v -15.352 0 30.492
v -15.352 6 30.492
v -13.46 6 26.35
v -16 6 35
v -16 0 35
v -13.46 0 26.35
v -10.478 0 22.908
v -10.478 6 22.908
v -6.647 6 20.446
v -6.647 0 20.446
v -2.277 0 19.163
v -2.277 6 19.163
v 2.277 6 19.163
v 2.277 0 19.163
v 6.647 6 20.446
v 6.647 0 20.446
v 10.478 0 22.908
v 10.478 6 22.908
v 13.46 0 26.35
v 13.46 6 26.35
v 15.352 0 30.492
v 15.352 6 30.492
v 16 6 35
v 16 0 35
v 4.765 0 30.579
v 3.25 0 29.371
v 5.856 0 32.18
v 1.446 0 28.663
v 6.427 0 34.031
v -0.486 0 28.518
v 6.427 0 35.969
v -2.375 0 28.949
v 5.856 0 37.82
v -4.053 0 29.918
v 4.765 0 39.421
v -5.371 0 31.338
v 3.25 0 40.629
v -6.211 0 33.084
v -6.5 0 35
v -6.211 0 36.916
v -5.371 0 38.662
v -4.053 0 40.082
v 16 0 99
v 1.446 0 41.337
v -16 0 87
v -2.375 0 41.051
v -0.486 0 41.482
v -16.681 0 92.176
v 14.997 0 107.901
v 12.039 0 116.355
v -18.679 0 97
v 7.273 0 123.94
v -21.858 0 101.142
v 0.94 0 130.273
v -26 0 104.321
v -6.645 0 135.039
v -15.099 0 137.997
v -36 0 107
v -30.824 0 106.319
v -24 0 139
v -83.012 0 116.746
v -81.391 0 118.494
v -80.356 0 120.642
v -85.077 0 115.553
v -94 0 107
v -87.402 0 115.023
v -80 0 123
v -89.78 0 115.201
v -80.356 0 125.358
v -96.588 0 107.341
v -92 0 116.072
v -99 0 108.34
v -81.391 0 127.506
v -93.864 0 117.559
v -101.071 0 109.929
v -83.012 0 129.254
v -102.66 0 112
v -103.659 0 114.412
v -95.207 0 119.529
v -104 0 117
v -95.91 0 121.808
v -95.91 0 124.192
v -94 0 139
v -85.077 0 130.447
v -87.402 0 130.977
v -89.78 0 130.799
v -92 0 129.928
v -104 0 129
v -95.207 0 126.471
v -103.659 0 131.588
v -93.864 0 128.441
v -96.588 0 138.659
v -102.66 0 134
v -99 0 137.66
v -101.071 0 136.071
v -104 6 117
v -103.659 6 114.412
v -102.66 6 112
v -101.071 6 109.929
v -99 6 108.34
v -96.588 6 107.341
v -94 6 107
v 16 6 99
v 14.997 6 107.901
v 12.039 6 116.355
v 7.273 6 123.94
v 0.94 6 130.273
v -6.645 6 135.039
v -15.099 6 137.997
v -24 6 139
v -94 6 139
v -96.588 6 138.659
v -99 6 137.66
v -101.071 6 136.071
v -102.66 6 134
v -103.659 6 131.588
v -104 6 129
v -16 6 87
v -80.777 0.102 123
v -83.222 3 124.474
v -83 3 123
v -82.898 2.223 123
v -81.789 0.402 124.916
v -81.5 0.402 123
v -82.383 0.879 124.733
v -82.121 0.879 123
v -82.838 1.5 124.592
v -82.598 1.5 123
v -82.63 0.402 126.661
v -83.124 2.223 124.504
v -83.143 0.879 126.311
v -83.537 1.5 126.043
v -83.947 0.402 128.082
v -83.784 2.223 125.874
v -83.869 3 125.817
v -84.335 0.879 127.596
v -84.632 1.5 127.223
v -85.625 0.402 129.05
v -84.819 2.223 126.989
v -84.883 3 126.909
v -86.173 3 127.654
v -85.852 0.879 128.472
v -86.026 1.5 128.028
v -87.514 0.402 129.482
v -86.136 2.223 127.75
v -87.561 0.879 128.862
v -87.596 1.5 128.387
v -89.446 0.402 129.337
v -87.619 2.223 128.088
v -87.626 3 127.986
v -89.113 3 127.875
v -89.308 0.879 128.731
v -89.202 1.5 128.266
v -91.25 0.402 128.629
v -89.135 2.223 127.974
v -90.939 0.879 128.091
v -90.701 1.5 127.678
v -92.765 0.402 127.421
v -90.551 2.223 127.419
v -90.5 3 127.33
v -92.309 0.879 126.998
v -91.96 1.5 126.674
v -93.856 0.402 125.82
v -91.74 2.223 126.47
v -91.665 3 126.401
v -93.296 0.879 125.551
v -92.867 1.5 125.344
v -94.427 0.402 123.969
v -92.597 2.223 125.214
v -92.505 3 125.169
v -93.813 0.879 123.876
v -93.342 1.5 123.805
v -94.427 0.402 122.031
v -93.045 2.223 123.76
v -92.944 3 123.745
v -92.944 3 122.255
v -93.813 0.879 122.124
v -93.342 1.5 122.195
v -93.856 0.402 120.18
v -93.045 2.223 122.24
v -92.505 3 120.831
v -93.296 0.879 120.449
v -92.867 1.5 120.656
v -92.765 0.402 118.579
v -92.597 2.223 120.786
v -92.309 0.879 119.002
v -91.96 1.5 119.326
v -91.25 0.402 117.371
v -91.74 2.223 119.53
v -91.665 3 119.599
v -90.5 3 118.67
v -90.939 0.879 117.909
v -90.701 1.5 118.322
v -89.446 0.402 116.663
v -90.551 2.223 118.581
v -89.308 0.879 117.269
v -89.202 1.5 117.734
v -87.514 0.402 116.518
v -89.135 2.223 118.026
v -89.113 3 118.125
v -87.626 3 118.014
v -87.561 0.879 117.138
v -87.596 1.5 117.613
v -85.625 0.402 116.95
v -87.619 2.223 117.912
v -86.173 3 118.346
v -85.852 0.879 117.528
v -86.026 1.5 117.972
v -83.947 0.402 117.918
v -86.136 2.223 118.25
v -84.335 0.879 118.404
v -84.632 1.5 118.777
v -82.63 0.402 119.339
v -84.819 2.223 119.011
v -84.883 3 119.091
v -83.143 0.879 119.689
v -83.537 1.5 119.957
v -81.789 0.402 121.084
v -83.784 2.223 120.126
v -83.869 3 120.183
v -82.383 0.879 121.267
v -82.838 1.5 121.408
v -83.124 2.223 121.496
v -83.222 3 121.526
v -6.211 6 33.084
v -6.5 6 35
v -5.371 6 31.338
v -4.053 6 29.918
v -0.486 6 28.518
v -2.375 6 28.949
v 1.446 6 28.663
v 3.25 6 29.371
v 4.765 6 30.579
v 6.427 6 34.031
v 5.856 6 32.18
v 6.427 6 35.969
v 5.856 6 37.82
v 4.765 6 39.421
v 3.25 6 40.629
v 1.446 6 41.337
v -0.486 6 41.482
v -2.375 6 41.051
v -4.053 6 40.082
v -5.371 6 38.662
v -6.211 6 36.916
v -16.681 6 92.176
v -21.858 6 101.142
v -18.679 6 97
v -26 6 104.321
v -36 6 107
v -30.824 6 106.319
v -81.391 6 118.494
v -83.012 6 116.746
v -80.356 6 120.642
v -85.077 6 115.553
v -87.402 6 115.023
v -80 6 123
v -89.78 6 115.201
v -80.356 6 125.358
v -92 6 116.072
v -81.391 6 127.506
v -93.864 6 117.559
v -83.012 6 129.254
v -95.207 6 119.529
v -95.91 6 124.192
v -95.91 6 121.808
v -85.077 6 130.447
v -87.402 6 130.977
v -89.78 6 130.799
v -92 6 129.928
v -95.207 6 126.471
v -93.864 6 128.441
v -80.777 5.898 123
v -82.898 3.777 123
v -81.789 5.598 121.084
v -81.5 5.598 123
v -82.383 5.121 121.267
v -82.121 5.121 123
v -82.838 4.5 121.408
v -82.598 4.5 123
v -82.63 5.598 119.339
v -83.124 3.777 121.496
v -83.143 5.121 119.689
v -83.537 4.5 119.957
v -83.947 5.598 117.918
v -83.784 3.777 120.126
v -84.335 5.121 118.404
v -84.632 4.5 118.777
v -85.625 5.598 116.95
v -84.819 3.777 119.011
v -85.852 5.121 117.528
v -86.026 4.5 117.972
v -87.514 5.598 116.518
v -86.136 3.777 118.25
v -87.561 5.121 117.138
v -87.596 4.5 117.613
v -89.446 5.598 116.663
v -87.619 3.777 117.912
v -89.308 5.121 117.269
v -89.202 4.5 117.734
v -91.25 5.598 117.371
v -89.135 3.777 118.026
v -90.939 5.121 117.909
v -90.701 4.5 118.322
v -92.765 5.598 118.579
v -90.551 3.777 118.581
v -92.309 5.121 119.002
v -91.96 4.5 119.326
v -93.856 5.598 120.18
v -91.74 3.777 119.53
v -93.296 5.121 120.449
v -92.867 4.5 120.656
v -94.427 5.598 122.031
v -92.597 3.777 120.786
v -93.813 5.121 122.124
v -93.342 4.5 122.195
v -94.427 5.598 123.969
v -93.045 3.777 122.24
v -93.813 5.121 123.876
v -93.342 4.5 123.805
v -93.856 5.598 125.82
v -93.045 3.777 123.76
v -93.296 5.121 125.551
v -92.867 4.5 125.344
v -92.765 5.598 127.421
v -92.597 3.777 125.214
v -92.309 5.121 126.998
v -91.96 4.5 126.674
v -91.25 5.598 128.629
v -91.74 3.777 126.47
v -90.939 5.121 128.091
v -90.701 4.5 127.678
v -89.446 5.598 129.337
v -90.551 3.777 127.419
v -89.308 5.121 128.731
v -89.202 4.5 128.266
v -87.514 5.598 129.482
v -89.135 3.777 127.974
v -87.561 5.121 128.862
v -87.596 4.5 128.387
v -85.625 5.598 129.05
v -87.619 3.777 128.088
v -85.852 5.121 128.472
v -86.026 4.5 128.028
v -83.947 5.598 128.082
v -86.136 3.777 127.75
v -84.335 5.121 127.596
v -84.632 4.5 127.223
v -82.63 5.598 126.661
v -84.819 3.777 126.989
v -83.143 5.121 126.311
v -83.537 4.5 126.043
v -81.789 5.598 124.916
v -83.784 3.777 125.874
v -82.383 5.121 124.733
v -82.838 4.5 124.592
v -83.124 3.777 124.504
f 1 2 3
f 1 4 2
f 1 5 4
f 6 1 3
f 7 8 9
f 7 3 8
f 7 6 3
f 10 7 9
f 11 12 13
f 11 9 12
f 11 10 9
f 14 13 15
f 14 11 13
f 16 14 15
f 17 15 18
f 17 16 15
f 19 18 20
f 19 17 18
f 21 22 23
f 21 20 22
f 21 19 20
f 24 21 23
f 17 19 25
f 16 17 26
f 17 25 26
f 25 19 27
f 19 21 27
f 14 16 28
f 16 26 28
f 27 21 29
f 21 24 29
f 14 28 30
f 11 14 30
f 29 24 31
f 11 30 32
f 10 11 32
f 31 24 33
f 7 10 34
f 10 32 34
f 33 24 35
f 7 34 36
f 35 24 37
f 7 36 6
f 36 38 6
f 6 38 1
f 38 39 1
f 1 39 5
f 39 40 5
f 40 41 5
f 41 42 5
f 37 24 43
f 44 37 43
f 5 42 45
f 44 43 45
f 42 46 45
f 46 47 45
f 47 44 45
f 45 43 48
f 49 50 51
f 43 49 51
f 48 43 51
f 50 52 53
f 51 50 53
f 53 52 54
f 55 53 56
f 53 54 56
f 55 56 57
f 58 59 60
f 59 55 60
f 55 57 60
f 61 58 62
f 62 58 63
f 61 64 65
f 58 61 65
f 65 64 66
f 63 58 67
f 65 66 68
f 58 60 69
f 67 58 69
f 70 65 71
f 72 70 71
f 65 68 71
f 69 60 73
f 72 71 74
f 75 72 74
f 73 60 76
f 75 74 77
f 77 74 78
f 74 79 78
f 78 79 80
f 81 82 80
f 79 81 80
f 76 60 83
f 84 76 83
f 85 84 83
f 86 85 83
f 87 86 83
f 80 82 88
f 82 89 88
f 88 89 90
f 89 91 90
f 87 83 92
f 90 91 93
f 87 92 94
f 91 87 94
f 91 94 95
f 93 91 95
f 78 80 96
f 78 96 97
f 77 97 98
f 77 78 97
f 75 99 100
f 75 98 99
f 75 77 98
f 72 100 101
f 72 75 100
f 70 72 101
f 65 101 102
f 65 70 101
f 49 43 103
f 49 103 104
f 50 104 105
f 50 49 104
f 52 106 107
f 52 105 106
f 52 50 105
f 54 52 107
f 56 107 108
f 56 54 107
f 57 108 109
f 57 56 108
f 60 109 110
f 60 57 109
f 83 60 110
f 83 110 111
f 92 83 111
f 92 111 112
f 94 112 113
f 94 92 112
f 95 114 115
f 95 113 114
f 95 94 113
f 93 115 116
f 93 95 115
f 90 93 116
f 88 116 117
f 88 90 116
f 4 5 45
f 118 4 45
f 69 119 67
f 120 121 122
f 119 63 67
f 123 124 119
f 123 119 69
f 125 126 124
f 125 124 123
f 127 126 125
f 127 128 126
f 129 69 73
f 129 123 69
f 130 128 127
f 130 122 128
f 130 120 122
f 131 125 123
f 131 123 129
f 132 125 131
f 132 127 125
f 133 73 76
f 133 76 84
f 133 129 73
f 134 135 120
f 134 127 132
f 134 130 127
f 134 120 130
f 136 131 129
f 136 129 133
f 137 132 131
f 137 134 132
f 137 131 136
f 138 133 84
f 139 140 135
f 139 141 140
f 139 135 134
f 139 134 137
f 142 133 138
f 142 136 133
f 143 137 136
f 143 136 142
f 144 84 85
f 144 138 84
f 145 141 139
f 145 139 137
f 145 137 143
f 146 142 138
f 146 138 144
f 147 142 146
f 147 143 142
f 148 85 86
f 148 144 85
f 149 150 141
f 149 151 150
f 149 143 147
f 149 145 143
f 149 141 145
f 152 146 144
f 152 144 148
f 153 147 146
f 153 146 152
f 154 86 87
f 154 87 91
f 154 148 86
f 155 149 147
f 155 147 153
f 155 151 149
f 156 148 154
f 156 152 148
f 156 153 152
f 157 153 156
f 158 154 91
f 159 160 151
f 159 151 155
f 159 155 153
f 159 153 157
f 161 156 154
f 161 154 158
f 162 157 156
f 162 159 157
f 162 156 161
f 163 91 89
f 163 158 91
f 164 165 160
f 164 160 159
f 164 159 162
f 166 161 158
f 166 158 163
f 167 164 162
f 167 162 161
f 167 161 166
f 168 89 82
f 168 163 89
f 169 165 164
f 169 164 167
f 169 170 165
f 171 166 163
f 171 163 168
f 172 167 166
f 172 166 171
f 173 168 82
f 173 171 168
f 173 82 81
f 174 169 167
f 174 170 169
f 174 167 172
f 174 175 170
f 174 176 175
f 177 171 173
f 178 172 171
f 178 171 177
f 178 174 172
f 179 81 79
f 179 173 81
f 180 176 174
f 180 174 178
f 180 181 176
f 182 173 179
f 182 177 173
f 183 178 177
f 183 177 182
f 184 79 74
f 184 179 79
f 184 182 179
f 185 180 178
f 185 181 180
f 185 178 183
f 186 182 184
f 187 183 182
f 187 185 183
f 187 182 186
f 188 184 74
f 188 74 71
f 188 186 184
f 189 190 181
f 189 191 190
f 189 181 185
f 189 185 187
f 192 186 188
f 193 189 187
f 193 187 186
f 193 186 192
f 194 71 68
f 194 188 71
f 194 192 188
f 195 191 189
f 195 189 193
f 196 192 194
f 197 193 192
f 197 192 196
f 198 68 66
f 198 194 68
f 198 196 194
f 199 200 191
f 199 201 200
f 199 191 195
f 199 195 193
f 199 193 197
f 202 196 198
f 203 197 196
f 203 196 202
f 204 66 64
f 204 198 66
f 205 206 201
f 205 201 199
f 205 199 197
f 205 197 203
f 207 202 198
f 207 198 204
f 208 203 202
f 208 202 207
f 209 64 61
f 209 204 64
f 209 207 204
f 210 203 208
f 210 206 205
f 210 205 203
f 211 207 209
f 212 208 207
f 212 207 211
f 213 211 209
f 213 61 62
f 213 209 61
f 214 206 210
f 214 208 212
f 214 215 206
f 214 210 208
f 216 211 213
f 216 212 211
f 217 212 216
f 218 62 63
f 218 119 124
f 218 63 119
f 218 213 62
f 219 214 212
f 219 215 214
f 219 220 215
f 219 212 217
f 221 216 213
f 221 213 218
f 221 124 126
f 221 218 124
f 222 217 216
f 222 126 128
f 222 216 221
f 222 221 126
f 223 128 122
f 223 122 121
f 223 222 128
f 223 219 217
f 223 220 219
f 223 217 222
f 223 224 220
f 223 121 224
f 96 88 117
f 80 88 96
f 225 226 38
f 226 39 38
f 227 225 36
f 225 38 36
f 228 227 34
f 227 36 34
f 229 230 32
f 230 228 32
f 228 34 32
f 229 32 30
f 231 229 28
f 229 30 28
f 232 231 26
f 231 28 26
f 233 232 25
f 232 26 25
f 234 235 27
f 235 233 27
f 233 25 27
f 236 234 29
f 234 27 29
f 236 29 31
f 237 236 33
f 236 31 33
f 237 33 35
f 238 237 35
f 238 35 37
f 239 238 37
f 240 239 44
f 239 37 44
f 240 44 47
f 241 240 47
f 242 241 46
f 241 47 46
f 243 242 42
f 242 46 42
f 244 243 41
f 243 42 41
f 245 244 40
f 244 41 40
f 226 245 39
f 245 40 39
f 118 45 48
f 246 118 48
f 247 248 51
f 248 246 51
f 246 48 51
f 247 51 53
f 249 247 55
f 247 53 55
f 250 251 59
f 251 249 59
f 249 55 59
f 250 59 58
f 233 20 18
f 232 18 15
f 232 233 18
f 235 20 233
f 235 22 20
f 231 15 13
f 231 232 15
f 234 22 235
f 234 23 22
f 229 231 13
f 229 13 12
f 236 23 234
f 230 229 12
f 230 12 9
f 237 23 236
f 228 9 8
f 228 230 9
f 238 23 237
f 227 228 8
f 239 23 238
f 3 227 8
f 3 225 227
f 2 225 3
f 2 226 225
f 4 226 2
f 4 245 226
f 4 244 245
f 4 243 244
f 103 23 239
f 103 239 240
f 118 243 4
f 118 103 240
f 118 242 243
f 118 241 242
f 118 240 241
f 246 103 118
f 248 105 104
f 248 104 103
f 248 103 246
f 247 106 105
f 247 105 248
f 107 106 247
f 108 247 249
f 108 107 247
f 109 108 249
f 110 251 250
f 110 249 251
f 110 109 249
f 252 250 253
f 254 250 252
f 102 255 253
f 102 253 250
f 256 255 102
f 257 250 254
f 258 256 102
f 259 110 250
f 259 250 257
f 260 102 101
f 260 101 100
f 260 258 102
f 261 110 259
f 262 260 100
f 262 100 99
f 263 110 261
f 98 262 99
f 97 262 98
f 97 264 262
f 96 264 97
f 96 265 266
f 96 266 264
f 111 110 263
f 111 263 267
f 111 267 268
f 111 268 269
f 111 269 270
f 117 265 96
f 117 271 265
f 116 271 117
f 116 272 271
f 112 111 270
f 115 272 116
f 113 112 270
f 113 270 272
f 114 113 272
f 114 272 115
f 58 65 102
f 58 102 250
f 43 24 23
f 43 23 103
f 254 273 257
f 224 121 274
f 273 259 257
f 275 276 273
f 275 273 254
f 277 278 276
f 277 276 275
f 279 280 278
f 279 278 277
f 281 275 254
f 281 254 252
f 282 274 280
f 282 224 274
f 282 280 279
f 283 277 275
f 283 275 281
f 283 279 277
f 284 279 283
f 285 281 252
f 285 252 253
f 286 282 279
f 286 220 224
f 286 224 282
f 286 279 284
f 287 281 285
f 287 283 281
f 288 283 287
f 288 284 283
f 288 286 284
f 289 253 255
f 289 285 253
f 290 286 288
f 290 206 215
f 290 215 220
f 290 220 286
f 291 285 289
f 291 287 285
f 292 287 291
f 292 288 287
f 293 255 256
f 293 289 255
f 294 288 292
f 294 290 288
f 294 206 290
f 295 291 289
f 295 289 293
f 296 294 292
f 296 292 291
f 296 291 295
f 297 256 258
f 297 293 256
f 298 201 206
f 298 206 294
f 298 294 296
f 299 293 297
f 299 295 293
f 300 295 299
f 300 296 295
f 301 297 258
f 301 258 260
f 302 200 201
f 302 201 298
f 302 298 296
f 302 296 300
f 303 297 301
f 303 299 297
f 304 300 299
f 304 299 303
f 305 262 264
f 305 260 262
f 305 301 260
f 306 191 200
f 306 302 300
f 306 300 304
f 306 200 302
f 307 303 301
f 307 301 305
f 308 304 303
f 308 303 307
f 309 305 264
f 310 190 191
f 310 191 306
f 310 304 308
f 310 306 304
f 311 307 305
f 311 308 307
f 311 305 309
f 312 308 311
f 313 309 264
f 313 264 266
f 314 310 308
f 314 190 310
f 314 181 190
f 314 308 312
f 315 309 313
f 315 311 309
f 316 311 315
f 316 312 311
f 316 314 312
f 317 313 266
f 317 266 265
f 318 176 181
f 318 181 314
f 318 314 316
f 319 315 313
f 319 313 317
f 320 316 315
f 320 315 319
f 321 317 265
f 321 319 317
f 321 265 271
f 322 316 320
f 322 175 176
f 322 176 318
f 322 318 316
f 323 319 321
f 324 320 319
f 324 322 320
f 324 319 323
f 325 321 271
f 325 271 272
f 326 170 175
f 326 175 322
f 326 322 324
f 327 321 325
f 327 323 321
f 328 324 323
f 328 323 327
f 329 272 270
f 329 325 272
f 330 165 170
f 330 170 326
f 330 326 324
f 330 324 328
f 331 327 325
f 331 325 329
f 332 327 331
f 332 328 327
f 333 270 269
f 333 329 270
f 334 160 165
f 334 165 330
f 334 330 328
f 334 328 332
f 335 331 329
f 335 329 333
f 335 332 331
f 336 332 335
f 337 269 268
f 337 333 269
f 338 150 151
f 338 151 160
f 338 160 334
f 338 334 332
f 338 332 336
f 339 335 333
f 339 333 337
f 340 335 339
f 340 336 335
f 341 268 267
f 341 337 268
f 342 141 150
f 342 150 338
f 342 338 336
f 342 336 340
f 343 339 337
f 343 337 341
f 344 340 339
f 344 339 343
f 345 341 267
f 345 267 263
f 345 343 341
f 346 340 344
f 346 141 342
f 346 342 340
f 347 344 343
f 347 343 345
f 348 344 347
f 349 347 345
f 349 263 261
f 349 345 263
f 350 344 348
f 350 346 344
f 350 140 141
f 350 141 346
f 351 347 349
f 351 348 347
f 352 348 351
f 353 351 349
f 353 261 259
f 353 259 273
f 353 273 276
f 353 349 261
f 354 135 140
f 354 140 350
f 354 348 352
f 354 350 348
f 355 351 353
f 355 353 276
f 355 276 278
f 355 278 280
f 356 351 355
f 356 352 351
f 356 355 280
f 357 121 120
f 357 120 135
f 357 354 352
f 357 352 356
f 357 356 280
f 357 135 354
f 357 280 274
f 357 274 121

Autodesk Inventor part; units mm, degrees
ref_plane "YZ Plane" through (0, 0, 0) normal (1, 0, 0) x (0, 1, 0)
ref_plane "XZ Plane" through (0, 0, 0) normal (0, 1, 0) x (-1, 0, 0)
ref_plane "XY Plane" through (0, 0, 0) normal (0, 0, 1) x (1, 0, 0)
sketch "Náčrt2" plane through (0, 0, 0) normal (0, 1, 0) x (-1, 0, 0)
  line L0 (11.5, 17.5) -> (-11.5, 17.5) construction
  line L1 (-17.5, 11.5) -> (-17.5, -11.5) construction
  line L2 (-11.5, -17.5) -> (11.5, -17.5) construction
  line L3 (17.5, -11.5) -> (17.5, 11.5) construction
  line L4 (42.5, 36) -> (42.5, -77.5) construction
  line L5 (9, -22.5) -> (-14, -22.5) construction
  line L6 (-20, -28.5) -> (-20, -51.5) construction
  line L7 (-14, -57.5) -> (9, -57.5) construction
  line L8 (15, -51.5) -> (15, -28.5) construction
  arc A0 (15, -28.5) -> (9, -22.5) centre (9, -28.5) ccw construction
  arc A1 (9, -57.5) -> (15, -51.5) centre (9, -51.5) ccw construction
  arc A2 (-20, -51.5) -> (-14, -57.5) centre (-14, -51.5) ccw construction
  arc A3 (-14, -22.5) -> (-20, -28.5) centre (-14, -28.5) ccw construction
  line L9 (-45.6938, -20) -> (9, -20) construction
  arc A4 (17.5, -28.5) -> (9, -20) centre (9, -28.5) ccw construction
  line L10 (17.5, -28.5) -> (17.5, -51.5) construction
  line L11 (17.5, -51.5) -> (15, -51.5) construction
  line L12 (-14, -22.5) -> (-45.6938, -22.5) construction
  line L13 (-45.6938, -22.5) -> (-45.6938, -20) construction
  arc A5 (17.5, 11.5) -> (11.5, 17.5) centre (11.5, 11.5) ccw construction
  arc A6 (11.5, -17.5) -> (17.5, -11.5) centre (11.5, -11.5) ccw construction
  arc A7 (-17.5, -11.5) -> (-11.5, -17.5) centre (-11.5, -11.5) ccw construction
  arc A8 (-11.5, 17.5) -> (-17.5, 11.5) centre (-11.5, 11.5) ccw construction
  line L14 (-11.5, -20) -> (11.5, -20) construction
  line L15 (-20, 73.4113) -> (-20, -11.5) construction
  arc A9 (-20, -11.5) -> (-11.5, -20) centre (-11.5, -11.5) ccw construction
  line L16 (-17.5, 11.5) -> (-17.5, 73.4113) construction
  line L17 (-17.5, 73.4113) -> (-20, 73.4113) construction
  line L18 (11.5, -20) -> (11.5, -17.5) construction
  line L19 (17.5, 17.5) -> (-17.5, 17.5) construction
  line L20 (-17.5, 17.5) -> (-17.5, 52.5) construction
  line L21 (-17.5, 52.5) -> (17.5, 52.5) construction
  line L22 (17.5, 52.5) -> (17.5, 17.5) construction
  circle A10 centre (0, 35) radius 6.5
  arc A11 (0, 51) -> (0, 19) centre (0, 35) ccw construction
  line L23 (0, 51) -> (27.5, 51) construction
  line L24 (0, 19) -> (11.5, 19) construction
  line L25 (27.5, 51) -> (42.5, 36) construction
  arc A12 (17.5, 13) -> (11.5, 19) centre (11.5, 13) ccw construction
  line L26 (17.5, 13) -> (17.5, -51.5) construction
  line L27 (-13.5, -57.5) -> (-13.5, -59.2574) construction
  line L28 (-12.6213, -61.3787) -> (14.1066, -88.1066) construction
  line L29 (24.7132, -92.5) -> (27.5, -92.5) construction
  arc A13 (27.5, -92.5) -> (42.5, -77.5) centre (27.5, -77.5) ccw construction
  arc A14 (14.1066, -88.1066) -> (24.7132, -92.5) centre (24.7132, -77.5) ccw construction
  arc A15 (-13.5, -59.2574) -> (-12.6213, -61.3787) centre (-10.5, -59.2574) ccw construction
  line L30 (17.5, -51.5) -> (17.5, -51.5) construction
  line L31 (6.4677, -58.2408) -> (-10.5, -57.5) construction
  line L32 (-13.5, -57.5) -> (-10.5, -57.5) construction
  line L33 (6.4677, -58.2408) -> (6.5, -57.5) construction
  line L34 (6.5, -57.5) -> (11.5, -57.5) construction
  arc A16 (11.5, -57.5) -> (17.5, -51.5) centre (11.5, -51.5) ccw construction
  arc A17 (-16, 35) -> (16, 35) centre (0, 35) ccw
  line L35 (16, 35) -> (16, 87)
  line L36 (-16, 35) -> (-16, 99)
  line L37 (24, 139) -> (94, 139)
  line L38 (104, 129) -> (104, 117)
  line L39 (94, 107) -> (36, 107)
  arc A18 (36, 107) -> (16, 87) centre (36, 87) ccw
  arc A19 (24, 139) -> (-16, 99) centre (24, 99) ccw
  arc A20 (104, 129) -> (94, 139) centre (94, 129) ccw
  arc A21 (94, 107) -> (104, 117) centre (94, 117) ccw
  point P0 (0, 0)
  point P1 (17.5, 0)
  point P2 (0, 17.5)
  point P3 (42.5, 51)
  point P4 (17.5, 35)
  point P5 (0, 52.5)
  point P6 (-13.5, -60.5)
  point P7 (16, 107)
  point P8 (-16, 139)
  point P9 (104, 139)
  point P10 (104, 107)
  dimension "d34" = 35
  dimension "d35" = 6
  dimension "d36" = 5
  dimension "d37" = 2.5
  dimension "d38" = 2.5
  dimension "d39" = 6
  dimension "d40" = 2.5
  dimension "d43" = 25
  dimension "d46" = 13
  dimension "d47" = 32
  dimension "d48" = 15
  dimension "d49" = 15
  dimension "d50" = 6
  dimension "d51" = 35
  dimension "d55" = 3
  dimension "d56" = 15
  dimension "d57" = 15
  dimension "d58" = 3
  dimension "d60" = 35
  dimension "d61" = 3
  dimension "d62" = 2.5
  dimension "d63" = 35
  dimension "d64" = 45
  dimension "d66" = 31
  dimension "d69" = 6
  dimension "d72" = 2.5
  dimension "d79" = 32
  dimension "d80" = 120
  dimension "d81" = 120
  dimension "d82" = 20
  dimension "d83" = 40
  dimension "d85" = 10
extrude "Vysunutí1" add sketch "Náčrt2" along normal blind 6
sketch "Náčrt5" plane through (0, 0, 0) normal (0, -1, 0) x (1, 0, 0)
  circle A0 centre (0, 35) radius 6.5 projected
  arc A1 (-16, 35) -> (16, 35) centre (0, 35) ccw projected
  line L0 (16, 99) -> (16, 35) projected
  line L1 (-16, 35) -> (-16, 87) projected
  circle A2 centre (-88, 123) radius 5
  arc A3 (16, 99) -> (-24, 139) centre (-24, 99) ccw projected
  line L2 (-94, 139) -> (-24, 139) projected
  line L3 (-104, 117) -> (-104, 129) projected
  line L4 (-36, 107) -> (-94, 107) projected
  arc A4 (-16, 87) -> (-36, 107) centre (-36, 87) ccw projected
  arc A5 (-94, 139) -> (-104, 129) centre (-94, 129) ccw projected
  arc A6 (-104, 117) -> (-94, 107) centre (-94, 117) ccw projected
  point P0 (0, 0)
  point P1 (-104, 123)
  dimension "d75" = 10
  dimension "d84" = 16
extrude "Vysunutí3" cut sketch "Náčrt5" against normal blind 10 contours A2
fillet "Zaoblení6" radius 3 2 edges at (-93, 0, 123) (-93, 6, 123)
equation "\"d49\" = d48"
equation "\"d79\" = d47"
equation "\"d81\" = d80"
equation "\"PoloměrOhybu\" = Tloušťka"
equation "\"ŠířkaVýštipu\" = Tloušťka"
equation "\"HloubkaVýštipu\" = 0.5 * Tloušťka"
equation "\"VelikostRohovéhoVýštipu\" = 4 * Tloušťka"
equation "\"MinimálníZbytek\" = 2 * Tloušťka"
equation "\"PřechodovýPoloměr\" = PoloměrOhybu"
equation "\"VelikostJacobihoPoloměru\" = PoloměrOhybu"
equation "\"VelikostMezery\" = Tloušťka"
equation "\"Tloušťka\" = 6"
properties part number "DD_KVD_002_10" material "Nerezová ocel"
